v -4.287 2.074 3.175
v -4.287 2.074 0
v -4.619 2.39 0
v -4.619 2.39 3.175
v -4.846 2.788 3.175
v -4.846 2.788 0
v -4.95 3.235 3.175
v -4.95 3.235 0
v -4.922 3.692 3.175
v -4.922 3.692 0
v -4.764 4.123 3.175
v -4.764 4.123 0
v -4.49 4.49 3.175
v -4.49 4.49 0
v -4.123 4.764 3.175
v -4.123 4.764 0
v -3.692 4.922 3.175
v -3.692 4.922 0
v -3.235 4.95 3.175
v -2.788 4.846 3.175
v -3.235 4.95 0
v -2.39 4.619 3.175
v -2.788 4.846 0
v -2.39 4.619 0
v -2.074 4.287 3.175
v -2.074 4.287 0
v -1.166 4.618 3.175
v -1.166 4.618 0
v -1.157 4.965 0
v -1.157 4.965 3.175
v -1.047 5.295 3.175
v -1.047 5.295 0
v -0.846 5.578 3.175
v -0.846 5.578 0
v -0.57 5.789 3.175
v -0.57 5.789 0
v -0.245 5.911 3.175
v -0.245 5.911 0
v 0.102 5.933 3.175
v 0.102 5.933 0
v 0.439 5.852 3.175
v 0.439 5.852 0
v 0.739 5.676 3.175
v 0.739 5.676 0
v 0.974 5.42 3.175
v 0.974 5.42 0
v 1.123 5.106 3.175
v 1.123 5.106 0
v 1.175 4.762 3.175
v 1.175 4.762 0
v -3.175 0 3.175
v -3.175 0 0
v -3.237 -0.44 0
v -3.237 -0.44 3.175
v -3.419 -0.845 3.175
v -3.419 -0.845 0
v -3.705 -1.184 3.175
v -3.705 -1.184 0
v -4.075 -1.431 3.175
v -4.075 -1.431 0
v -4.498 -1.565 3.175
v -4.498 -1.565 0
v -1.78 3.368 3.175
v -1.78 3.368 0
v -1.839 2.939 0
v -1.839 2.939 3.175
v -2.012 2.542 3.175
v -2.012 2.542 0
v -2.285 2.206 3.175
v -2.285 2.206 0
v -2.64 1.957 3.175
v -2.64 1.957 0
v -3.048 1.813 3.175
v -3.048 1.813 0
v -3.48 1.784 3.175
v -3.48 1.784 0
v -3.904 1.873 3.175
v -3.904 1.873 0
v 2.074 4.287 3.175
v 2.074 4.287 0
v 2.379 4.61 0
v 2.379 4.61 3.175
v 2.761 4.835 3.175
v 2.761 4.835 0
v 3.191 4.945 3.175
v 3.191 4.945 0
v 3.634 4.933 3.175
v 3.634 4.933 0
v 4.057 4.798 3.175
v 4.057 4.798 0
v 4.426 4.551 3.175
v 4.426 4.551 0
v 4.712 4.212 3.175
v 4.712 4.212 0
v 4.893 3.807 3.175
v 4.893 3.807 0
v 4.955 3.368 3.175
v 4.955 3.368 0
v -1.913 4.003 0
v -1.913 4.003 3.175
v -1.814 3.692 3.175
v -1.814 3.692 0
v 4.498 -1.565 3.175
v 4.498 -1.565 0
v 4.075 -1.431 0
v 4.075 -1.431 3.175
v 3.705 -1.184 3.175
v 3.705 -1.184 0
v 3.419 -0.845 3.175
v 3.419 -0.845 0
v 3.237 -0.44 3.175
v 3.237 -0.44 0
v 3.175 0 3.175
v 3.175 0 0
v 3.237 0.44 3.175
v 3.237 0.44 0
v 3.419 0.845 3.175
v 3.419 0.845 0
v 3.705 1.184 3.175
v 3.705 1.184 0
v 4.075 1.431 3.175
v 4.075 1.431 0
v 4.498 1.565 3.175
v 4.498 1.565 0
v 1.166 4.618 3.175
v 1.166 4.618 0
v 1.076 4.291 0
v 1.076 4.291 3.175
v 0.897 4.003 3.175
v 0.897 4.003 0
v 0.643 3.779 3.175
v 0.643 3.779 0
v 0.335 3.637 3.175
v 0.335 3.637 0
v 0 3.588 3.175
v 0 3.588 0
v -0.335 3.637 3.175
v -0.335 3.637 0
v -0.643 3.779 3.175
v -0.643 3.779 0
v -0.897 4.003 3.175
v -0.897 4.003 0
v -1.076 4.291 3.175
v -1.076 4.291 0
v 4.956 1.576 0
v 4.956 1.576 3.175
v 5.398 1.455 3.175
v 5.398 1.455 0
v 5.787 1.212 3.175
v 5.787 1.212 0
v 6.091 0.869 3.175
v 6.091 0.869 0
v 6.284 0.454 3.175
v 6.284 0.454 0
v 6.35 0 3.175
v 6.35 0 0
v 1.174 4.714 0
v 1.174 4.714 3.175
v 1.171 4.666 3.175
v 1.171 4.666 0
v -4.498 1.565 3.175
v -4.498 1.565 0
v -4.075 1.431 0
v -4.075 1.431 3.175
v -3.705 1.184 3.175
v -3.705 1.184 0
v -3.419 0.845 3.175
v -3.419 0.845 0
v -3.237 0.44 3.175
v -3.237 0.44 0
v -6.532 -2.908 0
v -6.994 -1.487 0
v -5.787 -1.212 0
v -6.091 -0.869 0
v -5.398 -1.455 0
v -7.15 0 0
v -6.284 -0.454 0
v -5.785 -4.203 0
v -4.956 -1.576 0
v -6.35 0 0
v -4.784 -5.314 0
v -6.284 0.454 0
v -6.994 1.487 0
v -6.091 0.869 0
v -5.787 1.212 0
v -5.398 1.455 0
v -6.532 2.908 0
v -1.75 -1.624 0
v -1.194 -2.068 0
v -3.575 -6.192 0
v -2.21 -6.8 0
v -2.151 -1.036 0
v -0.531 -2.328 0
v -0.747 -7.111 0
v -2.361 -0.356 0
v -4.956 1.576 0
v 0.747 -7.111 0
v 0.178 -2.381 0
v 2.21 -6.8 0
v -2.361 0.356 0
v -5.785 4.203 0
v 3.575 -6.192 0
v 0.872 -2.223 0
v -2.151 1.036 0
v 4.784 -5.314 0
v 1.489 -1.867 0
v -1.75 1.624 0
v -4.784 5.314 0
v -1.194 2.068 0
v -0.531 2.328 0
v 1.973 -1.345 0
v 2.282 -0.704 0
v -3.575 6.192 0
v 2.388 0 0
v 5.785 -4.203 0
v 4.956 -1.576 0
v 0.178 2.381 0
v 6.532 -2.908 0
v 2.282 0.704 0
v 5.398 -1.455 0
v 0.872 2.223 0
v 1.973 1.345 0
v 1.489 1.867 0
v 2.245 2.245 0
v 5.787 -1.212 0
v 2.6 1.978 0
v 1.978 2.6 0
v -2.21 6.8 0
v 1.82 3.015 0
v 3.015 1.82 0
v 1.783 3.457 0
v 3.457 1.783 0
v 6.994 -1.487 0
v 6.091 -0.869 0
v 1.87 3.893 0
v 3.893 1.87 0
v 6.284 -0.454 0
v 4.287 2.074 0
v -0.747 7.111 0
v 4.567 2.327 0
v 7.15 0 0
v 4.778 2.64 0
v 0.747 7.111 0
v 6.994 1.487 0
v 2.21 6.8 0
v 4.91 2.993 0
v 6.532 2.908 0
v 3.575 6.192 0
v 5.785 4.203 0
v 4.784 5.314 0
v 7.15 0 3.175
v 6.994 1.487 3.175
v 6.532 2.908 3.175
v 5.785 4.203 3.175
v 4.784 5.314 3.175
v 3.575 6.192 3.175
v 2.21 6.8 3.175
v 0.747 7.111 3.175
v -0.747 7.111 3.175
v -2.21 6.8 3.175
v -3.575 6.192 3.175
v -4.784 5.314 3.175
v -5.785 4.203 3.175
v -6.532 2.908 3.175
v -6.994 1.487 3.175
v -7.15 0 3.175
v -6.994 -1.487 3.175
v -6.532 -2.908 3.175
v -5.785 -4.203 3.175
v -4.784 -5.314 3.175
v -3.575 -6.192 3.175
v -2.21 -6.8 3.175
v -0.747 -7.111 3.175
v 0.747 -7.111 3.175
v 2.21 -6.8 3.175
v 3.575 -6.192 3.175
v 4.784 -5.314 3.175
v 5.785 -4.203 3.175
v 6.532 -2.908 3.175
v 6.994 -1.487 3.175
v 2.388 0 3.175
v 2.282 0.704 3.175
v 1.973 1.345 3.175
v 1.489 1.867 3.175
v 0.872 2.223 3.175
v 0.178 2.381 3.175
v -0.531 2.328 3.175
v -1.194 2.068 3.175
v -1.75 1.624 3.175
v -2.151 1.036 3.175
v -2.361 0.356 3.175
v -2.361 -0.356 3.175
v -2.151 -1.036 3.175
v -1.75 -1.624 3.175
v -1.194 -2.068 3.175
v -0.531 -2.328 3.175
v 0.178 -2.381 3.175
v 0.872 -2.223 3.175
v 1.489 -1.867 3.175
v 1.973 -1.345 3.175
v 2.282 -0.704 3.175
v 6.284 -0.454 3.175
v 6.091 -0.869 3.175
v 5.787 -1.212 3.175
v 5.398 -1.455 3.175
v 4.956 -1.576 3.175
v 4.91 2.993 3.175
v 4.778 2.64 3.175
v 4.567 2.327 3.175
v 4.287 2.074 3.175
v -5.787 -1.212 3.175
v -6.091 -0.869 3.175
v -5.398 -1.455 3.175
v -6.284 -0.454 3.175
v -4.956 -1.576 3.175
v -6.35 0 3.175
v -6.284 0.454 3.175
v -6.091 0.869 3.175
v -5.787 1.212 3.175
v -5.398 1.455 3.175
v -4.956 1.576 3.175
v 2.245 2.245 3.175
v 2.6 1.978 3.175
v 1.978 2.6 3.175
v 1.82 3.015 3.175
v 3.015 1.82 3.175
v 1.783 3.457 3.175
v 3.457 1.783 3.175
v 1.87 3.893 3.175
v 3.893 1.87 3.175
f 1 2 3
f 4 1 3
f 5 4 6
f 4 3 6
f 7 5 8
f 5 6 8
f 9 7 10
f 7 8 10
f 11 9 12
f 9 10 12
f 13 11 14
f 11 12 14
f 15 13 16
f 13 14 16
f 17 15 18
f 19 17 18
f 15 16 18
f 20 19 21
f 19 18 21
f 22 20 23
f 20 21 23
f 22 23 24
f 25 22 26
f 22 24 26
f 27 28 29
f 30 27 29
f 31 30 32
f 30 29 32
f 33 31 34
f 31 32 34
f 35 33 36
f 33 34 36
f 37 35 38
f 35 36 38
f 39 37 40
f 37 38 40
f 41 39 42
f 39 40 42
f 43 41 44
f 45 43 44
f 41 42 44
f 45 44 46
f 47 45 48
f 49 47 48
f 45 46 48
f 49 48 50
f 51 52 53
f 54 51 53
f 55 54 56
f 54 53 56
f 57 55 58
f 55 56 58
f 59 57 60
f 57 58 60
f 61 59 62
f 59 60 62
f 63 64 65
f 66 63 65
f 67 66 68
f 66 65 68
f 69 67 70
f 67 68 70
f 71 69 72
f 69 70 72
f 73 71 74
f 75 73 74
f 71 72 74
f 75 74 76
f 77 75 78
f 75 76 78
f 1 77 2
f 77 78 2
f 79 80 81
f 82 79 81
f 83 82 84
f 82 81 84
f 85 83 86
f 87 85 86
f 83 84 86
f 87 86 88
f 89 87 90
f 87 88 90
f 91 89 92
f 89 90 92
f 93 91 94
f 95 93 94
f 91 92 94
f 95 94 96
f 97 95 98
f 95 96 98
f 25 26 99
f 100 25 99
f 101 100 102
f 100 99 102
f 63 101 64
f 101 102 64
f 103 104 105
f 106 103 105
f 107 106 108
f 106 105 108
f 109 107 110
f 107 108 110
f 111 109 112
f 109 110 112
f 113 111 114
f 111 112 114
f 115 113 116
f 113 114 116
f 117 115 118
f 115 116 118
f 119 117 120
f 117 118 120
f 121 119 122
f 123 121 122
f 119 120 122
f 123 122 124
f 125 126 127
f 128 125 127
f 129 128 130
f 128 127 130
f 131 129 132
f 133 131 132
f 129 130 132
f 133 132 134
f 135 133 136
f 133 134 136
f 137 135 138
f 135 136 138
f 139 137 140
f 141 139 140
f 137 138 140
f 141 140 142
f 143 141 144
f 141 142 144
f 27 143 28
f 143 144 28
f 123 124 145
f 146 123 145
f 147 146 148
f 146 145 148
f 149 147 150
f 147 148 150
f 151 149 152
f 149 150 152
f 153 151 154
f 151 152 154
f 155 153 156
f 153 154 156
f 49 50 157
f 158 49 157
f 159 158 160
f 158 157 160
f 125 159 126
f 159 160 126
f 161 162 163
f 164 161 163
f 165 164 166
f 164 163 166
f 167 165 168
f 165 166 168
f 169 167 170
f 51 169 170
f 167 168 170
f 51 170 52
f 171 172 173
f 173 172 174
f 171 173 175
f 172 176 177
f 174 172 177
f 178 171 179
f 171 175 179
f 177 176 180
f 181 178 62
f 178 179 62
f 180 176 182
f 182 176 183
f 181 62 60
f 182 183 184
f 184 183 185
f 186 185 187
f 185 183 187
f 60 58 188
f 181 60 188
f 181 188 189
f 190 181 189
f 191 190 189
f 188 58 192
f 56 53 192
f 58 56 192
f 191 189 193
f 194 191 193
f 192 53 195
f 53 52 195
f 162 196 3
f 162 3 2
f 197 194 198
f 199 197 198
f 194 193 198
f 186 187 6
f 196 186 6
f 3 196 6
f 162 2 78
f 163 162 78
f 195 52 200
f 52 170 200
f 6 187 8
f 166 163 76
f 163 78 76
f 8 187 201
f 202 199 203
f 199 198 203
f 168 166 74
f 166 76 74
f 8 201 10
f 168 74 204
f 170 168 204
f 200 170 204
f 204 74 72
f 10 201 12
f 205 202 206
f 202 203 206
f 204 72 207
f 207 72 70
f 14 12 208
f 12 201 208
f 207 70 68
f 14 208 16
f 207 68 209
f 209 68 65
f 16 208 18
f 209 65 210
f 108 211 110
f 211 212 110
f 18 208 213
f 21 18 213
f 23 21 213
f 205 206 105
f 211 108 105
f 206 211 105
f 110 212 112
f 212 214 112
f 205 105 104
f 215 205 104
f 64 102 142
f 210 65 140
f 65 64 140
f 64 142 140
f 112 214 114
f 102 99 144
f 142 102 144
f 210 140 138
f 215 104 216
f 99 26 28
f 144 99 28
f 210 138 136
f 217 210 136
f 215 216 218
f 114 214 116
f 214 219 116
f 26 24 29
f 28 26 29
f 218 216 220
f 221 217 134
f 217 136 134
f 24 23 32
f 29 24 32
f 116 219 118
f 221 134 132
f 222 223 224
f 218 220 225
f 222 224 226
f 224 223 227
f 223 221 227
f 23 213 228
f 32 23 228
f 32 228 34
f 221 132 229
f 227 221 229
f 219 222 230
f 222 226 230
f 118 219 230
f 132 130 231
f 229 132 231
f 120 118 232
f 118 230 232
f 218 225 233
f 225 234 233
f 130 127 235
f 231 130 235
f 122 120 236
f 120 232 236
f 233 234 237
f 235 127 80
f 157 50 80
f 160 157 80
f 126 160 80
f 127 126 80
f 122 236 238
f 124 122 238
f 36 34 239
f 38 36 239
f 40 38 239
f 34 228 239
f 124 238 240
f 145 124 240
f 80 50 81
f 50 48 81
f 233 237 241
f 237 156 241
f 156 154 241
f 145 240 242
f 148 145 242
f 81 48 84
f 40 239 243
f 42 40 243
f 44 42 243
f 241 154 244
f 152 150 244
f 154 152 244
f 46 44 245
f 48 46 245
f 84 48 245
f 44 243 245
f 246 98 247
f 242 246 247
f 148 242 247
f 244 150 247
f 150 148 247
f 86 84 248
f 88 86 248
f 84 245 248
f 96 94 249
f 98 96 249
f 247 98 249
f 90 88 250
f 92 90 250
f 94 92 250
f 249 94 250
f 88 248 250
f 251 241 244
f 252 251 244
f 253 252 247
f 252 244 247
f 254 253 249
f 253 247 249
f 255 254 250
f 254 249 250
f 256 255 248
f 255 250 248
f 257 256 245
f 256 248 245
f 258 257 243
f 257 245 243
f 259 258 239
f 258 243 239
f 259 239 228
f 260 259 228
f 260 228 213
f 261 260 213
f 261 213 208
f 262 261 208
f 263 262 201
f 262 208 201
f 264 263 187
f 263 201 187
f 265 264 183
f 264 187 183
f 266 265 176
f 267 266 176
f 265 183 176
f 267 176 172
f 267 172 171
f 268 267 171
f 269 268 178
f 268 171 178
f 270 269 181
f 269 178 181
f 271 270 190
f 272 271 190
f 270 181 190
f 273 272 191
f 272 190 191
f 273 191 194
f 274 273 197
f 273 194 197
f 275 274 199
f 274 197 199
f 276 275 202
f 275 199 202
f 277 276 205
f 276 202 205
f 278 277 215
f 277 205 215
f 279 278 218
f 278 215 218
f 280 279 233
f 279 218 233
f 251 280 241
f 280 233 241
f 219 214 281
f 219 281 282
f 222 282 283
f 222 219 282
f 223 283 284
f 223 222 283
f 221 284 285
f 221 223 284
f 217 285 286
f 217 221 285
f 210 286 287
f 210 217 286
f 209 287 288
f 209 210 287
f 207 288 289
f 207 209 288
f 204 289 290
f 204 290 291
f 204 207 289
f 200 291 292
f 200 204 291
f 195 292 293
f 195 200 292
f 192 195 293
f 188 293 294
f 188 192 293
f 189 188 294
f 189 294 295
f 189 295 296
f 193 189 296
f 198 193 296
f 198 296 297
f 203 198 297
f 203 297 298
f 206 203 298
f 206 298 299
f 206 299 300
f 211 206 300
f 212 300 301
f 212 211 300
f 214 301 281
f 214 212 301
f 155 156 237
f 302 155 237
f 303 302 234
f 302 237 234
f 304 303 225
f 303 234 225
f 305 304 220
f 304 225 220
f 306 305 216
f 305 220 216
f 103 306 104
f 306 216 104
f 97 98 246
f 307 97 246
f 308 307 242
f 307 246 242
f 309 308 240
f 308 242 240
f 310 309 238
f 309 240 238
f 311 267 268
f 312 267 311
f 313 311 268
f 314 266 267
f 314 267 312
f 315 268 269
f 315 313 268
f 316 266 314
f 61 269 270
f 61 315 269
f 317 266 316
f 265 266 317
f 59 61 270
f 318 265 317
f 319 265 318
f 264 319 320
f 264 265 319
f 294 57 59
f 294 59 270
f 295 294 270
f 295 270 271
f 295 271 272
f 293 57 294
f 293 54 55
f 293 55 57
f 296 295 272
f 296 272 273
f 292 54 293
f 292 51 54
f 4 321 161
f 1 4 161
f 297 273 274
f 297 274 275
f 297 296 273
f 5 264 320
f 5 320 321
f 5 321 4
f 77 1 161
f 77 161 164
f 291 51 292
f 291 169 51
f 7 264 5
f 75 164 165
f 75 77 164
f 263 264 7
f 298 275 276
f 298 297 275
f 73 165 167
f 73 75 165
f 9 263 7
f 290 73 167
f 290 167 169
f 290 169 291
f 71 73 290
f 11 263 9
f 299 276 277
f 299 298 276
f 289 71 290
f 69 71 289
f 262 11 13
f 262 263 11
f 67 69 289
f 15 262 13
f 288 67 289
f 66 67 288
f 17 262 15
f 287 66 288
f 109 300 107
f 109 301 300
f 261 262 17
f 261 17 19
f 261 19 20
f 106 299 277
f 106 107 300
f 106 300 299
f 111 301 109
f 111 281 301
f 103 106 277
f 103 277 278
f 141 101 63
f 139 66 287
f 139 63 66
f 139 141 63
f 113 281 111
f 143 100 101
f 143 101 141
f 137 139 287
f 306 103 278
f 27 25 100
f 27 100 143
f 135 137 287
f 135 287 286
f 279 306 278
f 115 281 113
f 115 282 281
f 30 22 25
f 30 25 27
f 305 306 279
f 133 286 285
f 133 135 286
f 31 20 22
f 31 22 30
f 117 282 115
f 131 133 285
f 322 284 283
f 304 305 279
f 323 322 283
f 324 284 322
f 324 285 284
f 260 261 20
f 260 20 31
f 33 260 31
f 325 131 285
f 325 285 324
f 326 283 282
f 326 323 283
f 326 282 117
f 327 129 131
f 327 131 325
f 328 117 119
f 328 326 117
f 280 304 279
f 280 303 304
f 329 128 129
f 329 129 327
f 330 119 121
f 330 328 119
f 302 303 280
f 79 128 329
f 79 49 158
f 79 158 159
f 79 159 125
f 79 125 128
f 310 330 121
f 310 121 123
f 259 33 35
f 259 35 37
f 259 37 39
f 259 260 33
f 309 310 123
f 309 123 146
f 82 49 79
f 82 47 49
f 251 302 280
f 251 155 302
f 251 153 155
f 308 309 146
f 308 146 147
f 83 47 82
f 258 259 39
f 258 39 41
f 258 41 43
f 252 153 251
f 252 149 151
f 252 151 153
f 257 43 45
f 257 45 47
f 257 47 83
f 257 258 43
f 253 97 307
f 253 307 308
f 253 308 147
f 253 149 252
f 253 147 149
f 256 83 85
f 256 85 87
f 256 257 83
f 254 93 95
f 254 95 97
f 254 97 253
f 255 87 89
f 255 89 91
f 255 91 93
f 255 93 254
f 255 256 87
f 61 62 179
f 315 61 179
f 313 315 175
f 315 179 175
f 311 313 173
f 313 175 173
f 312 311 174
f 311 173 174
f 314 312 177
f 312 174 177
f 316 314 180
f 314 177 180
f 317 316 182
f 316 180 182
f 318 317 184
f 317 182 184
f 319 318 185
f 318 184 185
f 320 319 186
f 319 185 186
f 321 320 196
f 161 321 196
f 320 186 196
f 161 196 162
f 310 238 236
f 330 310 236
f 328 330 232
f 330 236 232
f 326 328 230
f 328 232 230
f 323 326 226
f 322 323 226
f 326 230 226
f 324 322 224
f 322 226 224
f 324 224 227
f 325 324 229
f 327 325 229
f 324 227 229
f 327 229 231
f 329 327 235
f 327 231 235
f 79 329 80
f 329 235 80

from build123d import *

# Parameters (mm, degrees)
F0_R     = 7.1501
F0_R_2   = 2.3876
F1_DEPTH = 3.175


with BuildPart() as f1:
    # F0 (on Top) → F1 (new body)
    with BuildSketch(Plane.XY):
        Circle(F0_R)
        with BuildLine():
            ThreePointArc((4.287339, 2.073676), (4.399976, 1.82253), (4.497917, 1.565296))
            ThreePointArc((4.497917, 1.565296), (5.787227, 1.212473), (6.35, 0))
            ThreePointArc((6.35, 0), (5.787227, -1.212473), (4.497917, -1.565296))
            ThreePointArc((4.497917, -1.565296), (0, -4.7625), (-4.497917, -1.565296))
            ThreePointArc((-4.497917, -1.565296), (-6.35, 0), (-4.497917, 1.565296))
            ThreePointArc((-4.497917, 1.565296), (-4.399976, 1.82253), (-4.287339, 2.073676))
            ThreePointArc((-4.287339, 2.073676), (-4.490128, 4.490128), (-2.073676, 4.287339))
            ThreePointArc((-2.073676, 4.287339), (-1.628125, 4.475558), (-1.165781, 4.617614))
            ThreePointArc((-1.165781, 4.617614), (-0.072582, 5.935006), (1.17475, 4.7625))
            ThreePointArc((1.17475, 4.7625), (1.172506, 4.689918), (1.165781, 4.617614))
            ThreePointArc((1.165781, 4.617614), (1.628125, 4.475558), (2.073676, 4.287339))
            ThreePointArc((2.073676, 4.287339), (3.850327, 4.879921), (4.955096, 3.367596))
            ThreePointArc((4.955096, 3.367596), (4.778314, 2.639563), (4.287339, 2.073676))
        make_face(mode=Mode.SUBTRACT)
        with BuildLine():
            ThreePointArc((4.497917, -1.565296), (3.175, 0), (4.497917, 1.565296))
            ThreePointArc((4.497917, 1.565296), (4.399976, 1.82253), (4.287339, 2.073676))
            ThreePointArc((4.287339, 2.073676), (2.245064, 2.245064), (2.073676, 4.287339))
            ThreePointArc((2.073676, 4.287339), (1.628125, 4.475558), (1.165781, 4.617614))
            ThreePointArc((1.165781, 4.617614), (0, 3.58775), (-1.165781, 4.617614))
            ThreePointArc((-1.165781, 4.617614), (-1.628125, 4.475558), (-2.073676, 4.287339))
            ThreePointArc((-2.073676, 4.287339), (-1.855271, 3.850327), (-1.780096, 3.367596))
            ThreePointArc((-1.780096, 3.367596), (-2.639563, 1.956879), (-4.287339, 2.073676))
            ThreePointArc((-4.287339, 2.073676), (-4.399976, 1.82253), (-4.497917, 1.565296))
            ThreePointArc((-4.497917, 1.565296), (-3.550027, 1.024727), (-3.175, 0))
            ThreePointArc((-3.175, 0), (-3.550027, -1.024727), (-4.497917, -1.565296))
            ThreePointArc((-4.497917, -1.565296), (0, -4.7625), (4.497917, -1.565296))
        make_face()
        Circle(F0_R_2, mode=Mode.SUBTRACT)
    extrude(amount=F1_DEPTH)


solid = f1.part
